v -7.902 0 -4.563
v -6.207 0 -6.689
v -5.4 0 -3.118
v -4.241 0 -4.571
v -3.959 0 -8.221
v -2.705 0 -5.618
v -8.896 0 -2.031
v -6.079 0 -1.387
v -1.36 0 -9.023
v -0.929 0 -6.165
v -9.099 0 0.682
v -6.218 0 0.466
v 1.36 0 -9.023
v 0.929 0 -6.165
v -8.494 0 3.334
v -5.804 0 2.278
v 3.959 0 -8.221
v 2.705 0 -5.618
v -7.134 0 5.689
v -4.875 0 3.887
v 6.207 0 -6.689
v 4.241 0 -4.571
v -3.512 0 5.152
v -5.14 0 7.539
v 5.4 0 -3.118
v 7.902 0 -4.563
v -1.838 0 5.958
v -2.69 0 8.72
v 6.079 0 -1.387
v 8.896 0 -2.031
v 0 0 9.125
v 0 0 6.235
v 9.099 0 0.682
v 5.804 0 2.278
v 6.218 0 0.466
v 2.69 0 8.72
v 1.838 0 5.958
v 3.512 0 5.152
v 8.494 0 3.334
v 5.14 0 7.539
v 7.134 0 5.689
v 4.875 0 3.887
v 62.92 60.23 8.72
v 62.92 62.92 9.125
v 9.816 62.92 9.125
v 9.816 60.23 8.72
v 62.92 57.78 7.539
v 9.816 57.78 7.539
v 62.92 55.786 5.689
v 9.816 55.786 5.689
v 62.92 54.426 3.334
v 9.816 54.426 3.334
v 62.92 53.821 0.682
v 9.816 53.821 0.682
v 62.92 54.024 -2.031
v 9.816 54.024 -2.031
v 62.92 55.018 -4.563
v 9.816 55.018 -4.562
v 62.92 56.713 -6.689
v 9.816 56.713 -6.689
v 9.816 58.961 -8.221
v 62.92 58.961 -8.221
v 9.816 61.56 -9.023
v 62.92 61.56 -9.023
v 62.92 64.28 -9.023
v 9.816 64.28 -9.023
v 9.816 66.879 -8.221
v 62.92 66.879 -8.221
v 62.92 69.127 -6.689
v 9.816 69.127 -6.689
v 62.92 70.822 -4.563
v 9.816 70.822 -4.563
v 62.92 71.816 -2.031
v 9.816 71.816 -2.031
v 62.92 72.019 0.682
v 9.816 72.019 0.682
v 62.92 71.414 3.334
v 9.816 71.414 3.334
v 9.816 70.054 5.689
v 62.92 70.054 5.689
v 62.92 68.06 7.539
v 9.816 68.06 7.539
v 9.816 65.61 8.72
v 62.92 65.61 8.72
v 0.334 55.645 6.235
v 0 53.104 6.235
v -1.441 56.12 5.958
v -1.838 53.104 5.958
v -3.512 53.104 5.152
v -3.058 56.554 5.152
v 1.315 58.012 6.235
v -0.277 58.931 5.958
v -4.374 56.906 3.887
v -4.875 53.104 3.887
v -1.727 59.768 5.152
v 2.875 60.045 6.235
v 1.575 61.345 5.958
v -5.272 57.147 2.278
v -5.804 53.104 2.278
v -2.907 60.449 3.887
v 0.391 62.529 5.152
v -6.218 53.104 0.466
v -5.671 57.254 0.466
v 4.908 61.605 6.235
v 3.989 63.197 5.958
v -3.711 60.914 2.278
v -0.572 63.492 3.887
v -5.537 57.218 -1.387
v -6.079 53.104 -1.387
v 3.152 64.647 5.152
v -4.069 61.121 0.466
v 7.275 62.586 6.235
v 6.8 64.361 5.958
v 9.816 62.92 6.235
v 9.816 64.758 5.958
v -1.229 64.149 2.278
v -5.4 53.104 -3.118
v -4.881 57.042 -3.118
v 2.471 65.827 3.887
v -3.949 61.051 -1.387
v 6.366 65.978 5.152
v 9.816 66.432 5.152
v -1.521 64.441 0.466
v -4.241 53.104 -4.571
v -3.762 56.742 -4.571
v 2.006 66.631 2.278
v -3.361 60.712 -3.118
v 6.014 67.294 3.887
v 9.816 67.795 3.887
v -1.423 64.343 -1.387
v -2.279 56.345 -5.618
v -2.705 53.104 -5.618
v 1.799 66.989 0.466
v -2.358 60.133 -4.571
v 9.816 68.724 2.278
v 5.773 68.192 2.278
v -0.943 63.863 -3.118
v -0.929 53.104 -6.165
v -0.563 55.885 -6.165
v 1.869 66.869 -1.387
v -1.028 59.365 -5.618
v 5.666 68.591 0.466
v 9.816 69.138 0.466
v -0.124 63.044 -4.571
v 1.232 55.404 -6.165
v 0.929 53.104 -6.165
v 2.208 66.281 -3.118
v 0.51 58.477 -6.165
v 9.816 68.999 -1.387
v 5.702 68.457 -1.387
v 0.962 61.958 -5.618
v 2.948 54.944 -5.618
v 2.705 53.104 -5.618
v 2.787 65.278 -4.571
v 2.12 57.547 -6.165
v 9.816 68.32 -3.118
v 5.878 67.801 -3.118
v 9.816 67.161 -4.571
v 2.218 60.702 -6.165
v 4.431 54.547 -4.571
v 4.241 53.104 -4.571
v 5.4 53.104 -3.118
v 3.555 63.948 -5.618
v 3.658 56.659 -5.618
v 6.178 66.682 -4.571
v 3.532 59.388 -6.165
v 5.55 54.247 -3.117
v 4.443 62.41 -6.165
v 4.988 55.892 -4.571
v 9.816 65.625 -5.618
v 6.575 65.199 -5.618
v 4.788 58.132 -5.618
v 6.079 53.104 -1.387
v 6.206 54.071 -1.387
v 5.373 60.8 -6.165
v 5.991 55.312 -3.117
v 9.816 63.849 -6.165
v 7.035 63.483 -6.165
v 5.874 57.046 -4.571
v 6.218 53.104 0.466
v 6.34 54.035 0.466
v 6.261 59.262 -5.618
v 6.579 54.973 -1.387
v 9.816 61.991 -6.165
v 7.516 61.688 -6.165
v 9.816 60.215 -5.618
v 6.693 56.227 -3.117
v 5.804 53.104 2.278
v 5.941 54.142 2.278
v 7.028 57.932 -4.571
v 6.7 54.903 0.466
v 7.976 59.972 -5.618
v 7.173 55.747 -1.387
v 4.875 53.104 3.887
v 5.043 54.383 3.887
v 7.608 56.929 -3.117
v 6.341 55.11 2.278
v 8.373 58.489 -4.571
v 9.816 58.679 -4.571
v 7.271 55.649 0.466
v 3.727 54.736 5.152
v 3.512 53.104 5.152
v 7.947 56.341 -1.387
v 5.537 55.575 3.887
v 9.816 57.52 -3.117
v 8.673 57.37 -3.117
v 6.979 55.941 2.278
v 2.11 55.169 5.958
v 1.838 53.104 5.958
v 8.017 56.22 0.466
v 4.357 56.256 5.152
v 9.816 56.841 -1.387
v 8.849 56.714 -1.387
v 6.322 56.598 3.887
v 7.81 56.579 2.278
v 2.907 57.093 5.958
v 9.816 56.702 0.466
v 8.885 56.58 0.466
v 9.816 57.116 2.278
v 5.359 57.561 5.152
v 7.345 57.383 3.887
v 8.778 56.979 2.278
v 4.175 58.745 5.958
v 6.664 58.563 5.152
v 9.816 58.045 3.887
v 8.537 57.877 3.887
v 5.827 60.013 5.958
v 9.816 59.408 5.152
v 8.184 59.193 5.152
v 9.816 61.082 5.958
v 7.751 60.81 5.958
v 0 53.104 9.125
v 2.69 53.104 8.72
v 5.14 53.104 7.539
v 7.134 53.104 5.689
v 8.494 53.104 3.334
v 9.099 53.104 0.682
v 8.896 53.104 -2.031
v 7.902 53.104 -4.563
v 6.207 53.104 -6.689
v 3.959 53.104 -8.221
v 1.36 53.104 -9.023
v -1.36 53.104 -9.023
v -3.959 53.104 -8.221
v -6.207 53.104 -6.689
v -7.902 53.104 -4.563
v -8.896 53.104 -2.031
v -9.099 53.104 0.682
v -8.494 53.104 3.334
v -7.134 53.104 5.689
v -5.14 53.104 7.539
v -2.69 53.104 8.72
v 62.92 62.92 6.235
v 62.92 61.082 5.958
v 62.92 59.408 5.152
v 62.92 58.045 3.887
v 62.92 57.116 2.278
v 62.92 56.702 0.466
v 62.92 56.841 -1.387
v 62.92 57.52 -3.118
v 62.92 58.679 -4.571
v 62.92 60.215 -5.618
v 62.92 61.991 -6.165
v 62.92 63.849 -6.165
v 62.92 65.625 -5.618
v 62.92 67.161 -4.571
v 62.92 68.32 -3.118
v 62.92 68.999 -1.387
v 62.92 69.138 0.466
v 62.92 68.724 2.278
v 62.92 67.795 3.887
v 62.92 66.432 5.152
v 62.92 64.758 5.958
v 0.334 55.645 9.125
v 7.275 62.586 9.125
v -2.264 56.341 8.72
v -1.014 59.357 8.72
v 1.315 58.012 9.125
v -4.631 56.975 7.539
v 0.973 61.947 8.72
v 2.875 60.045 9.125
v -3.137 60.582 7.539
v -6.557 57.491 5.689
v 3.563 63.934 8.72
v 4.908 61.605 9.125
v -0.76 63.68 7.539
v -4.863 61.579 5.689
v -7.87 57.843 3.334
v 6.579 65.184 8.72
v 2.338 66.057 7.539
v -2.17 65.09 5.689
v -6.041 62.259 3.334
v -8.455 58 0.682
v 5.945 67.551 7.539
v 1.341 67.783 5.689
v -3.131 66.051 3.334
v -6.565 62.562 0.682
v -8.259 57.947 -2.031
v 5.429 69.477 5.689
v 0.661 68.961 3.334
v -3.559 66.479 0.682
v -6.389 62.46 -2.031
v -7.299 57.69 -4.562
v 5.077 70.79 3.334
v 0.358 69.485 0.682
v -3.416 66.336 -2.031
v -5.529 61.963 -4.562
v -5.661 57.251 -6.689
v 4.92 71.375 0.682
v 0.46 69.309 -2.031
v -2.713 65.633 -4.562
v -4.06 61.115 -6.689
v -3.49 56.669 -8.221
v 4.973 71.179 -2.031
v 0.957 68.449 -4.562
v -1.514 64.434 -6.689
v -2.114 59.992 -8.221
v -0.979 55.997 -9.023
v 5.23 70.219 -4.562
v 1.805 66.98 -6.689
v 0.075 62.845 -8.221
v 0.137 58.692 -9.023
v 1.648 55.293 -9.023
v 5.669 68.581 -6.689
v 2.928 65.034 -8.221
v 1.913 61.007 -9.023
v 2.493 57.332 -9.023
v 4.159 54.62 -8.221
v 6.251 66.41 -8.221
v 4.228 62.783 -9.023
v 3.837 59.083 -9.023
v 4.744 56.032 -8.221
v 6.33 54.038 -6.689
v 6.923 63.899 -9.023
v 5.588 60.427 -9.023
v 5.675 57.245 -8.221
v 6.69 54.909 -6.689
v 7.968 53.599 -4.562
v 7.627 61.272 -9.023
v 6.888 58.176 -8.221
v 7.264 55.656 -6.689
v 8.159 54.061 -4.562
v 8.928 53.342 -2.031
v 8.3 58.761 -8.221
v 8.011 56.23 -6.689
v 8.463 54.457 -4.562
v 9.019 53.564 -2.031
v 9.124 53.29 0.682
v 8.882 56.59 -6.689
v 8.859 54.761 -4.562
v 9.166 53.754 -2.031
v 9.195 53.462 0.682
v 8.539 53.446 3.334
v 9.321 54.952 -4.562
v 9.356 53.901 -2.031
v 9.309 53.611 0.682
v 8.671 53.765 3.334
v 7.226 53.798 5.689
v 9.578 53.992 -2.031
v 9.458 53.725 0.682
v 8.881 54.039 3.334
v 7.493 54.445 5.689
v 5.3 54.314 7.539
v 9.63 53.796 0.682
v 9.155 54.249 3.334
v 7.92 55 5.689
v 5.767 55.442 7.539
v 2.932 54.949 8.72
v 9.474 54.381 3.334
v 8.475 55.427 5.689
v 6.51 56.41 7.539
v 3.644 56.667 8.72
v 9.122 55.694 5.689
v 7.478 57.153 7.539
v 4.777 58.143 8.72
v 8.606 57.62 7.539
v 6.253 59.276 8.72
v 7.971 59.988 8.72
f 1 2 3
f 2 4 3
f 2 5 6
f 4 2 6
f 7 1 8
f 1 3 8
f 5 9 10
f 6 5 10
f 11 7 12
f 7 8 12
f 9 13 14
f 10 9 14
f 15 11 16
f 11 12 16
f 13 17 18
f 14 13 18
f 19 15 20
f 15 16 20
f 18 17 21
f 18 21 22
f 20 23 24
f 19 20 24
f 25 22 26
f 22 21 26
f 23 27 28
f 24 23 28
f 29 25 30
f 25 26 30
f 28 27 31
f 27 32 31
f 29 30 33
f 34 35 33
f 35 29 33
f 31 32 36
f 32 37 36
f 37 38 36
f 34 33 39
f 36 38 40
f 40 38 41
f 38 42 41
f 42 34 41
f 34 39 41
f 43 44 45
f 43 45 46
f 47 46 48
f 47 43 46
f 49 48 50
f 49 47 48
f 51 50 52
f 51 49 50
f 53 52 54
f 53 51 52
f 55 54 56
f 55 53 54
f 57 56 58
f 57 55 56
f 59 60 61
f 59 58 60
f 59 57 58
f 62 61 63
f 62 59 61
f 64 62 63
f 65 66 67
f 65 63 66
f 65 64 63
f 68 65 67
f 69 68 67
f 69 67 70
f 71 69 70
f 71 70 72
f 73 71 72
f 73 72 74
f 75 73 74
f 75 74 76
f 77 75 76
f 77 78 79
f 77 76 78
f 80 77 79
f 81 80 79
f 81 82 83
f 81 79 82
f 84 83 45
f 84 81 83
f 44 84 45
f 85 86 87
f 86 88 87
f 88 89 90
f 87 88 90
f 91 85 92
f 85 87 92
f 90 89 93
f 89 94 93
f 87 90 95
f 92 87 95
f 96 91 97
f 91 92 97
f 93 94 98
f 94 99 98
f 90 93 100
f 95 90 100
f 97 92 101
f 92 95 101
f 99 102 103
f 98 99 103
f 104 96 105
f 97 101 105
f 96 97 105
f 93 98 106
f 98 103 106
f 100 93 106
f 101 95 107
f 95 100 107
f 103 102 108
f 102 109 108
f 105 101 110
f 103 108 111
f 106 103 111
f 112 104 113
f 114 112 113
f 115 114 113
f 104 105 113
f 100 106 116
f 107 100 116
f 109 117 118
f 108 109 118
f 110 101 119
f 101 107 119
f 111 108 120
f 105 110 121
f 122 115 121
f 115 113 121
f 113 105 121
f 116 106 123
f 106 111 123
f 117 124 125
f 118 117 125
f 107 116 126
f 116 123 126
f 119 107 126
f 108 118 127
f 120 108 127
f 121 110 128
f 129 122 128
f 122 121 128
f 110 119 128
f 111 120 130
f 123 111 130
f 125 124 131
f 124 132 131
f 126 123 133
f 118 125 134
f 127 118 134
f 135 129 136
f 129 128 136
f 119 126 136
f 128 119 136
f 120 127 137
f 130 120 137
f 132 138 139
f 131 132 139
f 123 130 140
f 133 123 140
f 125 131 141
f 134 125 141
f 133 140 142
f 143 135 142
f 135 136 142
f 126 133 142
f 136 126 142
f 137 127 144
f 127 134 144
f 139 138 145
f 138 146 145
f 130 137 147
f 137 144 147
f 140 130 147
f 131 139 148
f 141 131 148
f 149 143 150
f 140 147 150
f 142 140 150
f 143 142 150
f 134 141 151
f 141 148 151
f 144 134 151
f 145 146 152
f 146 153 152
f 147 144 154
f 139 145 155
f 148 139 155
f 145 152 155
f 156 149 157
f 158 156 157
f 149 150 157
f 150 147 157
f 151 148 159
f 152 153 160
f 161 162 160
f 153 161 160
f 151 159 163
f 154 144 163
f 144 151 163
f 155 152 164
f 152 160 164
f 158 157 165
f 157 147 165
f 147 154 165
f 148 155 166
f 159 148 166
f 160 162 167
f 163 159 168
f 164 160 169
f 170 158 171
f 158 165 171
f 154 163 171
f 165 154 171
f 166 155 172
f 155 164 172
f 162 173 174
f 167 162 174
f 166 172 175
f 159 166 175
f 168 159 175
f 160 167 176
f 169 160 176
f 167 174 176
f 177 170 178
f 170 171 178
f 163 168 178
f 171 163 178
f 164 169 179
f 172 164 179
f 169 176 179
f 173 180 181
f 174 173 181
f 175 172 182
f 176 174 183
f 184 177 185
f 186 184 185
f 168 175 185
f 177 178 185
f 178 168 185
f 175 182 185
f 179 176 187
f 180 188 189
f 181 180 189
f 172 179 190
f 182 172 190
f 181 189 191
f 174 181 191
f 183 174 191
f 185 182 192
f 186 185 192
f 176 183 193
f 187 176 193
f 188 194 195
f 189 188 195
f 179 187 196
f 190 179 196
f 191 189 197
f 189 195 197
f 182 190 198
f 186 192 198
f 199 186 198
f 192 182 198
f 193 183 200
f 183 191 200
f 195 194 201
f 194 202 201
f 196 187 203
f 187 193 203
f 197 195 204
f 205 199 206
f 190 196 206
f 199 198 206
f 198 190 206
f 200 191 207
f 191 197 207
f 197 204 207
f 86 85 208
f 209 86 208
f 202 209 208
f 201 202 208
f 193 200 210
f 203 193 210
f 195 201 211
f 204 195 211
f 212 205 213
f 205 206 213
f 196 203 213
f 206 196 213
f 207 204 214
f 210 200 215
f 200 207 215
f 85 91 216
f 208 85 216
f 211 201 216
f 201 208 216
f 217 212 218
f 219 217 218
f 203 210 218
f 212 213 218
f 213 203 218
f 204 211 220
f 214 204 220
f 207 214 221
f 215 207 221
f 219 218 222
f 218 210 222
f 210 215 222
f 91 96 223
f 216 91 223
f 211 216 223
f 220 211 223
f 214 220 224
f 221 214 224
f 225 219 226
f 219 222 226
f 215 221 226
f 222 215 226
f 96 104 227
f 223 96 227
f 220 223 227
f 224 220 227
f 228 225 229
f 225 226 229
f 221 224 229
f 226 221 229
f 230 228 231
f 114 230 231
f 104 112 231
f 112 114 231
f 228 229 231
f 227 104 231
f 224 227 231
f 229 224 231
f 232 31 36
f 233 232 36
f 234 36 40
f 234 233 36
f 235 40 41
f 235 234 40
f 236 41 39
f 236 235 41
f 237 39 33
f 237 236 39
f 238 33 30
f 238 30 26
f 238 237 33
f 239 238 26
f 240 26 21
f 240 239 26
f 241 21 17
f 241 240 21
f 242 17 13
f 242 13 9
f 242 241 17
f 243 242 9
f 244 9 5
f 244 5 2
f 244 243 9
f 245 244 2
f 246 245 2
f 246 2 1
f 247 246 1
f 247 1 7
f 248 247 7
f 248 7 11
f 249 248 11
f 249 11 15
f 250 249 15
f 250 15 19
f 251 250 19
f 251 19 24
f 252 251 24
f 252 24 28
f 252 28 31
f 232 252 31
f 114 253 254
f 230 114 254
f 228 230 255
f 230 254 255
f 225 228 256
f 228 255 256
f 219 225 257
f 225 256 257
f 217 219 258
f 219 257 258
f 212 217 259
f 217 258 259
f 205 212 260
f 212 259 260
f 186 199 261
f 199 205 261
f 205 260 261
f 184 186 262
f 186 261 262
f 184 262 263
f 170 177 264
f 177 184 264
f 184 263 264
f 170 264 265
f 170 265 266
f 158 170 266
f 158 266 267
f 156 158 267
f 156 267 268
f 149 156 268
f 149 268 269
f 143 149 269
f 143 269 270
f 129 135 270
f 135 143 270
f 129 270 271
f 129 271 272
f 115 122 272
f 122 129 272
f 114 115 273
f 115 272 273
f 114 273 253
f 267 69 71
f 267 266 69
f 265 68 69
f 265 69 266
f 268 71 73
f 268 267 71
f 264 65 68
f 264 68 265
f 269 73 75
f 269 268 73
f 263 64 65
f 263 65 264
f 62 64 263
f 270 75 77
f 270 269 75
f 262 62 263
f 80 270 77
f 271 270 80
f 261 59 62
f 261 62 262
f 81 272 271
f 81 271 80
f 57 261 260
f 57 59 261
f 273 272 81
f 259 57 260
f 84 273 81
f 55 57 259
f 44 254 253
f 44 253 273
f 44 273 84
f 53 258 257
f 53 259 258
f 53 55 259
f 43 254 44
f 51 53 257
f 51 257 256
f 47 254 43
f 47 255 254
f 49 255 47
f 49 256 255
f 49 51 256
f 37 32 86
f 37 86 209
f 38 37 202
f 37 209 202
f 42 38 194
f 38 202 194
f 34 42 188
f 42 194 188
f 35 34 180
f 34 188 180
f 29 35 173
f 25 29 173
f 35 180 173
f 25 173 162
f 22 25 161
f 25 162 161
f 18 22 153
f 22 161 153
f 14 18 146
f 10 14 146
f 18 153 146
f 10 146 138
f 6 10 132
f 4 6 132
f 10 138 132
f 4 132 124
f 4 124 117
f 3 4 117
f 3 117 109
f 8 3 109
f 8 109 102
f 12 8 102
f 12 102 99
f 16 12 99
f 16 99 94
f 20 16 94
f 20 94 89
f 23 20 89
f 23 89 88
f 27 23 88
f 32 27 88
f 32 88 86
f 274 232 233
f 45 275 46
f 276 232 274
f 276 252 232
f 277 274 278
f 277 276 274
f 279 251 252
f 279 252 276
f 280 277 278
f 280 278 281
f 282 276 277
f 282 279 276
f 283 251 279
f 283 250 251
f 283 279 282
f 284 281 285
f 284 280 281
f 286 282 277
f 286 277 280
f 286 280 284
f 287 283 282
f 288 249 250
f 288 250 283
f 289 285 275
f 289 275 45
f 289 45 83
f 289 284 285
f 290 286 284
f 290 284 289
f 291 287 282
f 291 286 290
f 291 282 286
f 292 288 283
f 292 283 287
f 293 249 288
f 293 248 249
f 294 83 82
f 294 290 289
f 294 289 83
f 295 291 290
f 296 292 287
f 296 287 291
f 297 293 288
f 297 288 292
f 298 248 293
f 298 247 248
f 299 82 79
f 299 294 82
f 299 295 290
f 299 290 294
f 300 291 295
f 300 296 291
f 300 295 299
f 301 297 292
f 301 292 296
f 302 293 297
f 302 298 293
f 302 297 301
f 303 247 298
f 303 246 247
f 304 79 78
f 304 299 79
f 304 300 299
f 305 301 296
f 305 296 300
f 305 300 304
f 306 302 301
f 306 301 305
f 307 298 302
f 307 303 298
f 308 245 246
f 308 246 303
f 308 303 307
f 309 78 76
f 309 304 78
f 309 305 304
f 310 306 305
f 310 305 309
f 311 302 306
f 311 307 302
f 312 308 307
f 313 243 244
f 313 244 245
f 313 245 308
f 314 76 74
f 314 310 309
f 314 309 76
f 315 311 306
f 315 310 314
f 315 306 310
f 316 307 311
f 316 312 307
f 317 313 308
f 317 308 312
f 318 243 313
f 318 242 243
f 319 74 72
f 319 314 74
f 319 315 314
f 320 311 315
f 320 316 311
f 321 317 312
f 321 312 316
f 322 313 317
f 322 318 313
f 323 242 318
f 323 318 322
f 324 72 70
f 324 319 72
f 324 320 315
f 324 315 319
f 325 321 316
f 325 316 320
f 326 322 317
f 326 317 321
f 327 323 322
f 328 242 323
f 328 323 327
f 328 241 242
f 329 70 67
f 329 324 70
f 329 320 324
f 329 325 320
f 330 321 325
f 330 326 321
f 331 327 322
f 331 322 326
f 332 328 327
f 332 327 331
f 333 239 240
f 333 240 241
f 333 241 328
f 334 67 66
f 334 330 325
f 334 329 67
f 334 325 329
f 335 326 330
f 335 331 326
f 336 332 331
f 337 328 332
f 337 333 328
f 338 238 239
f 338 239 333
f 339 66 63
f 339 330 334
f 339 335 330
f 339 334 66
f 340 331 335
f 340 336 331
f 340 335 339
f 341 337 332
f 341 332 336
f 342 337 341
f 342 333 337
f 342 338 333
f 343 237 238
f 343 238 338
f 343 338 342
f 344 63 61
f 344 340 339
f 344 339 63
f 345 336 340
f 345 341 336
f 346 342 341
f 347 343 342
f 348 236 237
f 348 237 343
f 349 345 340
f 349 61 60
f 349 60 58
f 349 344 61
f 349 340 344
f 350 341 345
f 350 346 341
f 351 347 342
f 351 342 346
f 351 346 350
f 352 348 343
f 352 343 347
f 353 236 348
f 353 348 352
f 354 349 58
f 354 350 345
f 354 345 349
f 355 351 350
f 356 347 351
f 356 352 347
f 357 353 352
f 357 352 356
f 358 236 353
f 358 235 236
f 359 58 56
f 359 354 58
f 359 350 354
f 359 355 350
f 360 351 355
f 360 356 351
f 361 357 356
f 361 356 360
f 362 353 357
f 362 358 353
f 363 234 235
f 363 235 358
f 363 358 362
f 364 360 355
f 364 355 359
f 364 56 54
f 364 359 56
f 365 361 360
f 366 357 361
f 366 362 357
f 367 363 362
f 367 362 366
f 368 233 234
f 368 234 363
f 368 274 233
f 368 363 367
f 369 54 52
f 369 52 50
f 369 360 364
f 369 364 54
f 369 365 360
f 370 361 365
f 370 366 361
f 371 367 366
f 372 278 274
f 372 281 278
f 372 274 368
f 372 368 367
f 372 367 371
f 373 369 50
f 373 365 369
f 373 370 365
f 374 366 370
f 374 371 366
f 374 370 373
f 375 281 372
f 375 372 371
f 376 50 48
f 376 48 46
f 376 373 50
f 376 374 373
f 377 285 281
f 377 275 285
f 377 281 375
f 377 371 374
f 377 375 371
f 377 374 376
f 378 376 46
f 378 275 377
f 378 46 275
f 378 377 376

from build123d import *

# Parameters (mm, degrees)
SWEEP_THIN6_PROFILE_R   = 9.125
SWEEP_THIN6_PROFILE_R_2 = 6.235


with BuildPart() as part:
    # Sweep-Thin6: sweep along a path in Sketch78
    with BuildLine(Plane.XY) as sweep_thin6_path:
        Line((0, 0), (0, 53.104143086))
        ThreePointArc((0, 53.104143086), (2.874997927, 60.045002073), (9.815856914, 62.92))
        Line((9.815856914, 62.92), (62.92, 62.92))
    # Sweep-Thin6 profile (on start of the path) → Sweep-Thin6 (sweep)
    with BuildSketch(Plane.ZX):
        Circle(SWEEP_THIN6_PROFILE_R)
        Circle(SWEEP_THIN6_PROFILE_R_2, mode=Mode.SUBTRACT)
    sweep(path=sweep_thin6_path.line)


solid = part.part
